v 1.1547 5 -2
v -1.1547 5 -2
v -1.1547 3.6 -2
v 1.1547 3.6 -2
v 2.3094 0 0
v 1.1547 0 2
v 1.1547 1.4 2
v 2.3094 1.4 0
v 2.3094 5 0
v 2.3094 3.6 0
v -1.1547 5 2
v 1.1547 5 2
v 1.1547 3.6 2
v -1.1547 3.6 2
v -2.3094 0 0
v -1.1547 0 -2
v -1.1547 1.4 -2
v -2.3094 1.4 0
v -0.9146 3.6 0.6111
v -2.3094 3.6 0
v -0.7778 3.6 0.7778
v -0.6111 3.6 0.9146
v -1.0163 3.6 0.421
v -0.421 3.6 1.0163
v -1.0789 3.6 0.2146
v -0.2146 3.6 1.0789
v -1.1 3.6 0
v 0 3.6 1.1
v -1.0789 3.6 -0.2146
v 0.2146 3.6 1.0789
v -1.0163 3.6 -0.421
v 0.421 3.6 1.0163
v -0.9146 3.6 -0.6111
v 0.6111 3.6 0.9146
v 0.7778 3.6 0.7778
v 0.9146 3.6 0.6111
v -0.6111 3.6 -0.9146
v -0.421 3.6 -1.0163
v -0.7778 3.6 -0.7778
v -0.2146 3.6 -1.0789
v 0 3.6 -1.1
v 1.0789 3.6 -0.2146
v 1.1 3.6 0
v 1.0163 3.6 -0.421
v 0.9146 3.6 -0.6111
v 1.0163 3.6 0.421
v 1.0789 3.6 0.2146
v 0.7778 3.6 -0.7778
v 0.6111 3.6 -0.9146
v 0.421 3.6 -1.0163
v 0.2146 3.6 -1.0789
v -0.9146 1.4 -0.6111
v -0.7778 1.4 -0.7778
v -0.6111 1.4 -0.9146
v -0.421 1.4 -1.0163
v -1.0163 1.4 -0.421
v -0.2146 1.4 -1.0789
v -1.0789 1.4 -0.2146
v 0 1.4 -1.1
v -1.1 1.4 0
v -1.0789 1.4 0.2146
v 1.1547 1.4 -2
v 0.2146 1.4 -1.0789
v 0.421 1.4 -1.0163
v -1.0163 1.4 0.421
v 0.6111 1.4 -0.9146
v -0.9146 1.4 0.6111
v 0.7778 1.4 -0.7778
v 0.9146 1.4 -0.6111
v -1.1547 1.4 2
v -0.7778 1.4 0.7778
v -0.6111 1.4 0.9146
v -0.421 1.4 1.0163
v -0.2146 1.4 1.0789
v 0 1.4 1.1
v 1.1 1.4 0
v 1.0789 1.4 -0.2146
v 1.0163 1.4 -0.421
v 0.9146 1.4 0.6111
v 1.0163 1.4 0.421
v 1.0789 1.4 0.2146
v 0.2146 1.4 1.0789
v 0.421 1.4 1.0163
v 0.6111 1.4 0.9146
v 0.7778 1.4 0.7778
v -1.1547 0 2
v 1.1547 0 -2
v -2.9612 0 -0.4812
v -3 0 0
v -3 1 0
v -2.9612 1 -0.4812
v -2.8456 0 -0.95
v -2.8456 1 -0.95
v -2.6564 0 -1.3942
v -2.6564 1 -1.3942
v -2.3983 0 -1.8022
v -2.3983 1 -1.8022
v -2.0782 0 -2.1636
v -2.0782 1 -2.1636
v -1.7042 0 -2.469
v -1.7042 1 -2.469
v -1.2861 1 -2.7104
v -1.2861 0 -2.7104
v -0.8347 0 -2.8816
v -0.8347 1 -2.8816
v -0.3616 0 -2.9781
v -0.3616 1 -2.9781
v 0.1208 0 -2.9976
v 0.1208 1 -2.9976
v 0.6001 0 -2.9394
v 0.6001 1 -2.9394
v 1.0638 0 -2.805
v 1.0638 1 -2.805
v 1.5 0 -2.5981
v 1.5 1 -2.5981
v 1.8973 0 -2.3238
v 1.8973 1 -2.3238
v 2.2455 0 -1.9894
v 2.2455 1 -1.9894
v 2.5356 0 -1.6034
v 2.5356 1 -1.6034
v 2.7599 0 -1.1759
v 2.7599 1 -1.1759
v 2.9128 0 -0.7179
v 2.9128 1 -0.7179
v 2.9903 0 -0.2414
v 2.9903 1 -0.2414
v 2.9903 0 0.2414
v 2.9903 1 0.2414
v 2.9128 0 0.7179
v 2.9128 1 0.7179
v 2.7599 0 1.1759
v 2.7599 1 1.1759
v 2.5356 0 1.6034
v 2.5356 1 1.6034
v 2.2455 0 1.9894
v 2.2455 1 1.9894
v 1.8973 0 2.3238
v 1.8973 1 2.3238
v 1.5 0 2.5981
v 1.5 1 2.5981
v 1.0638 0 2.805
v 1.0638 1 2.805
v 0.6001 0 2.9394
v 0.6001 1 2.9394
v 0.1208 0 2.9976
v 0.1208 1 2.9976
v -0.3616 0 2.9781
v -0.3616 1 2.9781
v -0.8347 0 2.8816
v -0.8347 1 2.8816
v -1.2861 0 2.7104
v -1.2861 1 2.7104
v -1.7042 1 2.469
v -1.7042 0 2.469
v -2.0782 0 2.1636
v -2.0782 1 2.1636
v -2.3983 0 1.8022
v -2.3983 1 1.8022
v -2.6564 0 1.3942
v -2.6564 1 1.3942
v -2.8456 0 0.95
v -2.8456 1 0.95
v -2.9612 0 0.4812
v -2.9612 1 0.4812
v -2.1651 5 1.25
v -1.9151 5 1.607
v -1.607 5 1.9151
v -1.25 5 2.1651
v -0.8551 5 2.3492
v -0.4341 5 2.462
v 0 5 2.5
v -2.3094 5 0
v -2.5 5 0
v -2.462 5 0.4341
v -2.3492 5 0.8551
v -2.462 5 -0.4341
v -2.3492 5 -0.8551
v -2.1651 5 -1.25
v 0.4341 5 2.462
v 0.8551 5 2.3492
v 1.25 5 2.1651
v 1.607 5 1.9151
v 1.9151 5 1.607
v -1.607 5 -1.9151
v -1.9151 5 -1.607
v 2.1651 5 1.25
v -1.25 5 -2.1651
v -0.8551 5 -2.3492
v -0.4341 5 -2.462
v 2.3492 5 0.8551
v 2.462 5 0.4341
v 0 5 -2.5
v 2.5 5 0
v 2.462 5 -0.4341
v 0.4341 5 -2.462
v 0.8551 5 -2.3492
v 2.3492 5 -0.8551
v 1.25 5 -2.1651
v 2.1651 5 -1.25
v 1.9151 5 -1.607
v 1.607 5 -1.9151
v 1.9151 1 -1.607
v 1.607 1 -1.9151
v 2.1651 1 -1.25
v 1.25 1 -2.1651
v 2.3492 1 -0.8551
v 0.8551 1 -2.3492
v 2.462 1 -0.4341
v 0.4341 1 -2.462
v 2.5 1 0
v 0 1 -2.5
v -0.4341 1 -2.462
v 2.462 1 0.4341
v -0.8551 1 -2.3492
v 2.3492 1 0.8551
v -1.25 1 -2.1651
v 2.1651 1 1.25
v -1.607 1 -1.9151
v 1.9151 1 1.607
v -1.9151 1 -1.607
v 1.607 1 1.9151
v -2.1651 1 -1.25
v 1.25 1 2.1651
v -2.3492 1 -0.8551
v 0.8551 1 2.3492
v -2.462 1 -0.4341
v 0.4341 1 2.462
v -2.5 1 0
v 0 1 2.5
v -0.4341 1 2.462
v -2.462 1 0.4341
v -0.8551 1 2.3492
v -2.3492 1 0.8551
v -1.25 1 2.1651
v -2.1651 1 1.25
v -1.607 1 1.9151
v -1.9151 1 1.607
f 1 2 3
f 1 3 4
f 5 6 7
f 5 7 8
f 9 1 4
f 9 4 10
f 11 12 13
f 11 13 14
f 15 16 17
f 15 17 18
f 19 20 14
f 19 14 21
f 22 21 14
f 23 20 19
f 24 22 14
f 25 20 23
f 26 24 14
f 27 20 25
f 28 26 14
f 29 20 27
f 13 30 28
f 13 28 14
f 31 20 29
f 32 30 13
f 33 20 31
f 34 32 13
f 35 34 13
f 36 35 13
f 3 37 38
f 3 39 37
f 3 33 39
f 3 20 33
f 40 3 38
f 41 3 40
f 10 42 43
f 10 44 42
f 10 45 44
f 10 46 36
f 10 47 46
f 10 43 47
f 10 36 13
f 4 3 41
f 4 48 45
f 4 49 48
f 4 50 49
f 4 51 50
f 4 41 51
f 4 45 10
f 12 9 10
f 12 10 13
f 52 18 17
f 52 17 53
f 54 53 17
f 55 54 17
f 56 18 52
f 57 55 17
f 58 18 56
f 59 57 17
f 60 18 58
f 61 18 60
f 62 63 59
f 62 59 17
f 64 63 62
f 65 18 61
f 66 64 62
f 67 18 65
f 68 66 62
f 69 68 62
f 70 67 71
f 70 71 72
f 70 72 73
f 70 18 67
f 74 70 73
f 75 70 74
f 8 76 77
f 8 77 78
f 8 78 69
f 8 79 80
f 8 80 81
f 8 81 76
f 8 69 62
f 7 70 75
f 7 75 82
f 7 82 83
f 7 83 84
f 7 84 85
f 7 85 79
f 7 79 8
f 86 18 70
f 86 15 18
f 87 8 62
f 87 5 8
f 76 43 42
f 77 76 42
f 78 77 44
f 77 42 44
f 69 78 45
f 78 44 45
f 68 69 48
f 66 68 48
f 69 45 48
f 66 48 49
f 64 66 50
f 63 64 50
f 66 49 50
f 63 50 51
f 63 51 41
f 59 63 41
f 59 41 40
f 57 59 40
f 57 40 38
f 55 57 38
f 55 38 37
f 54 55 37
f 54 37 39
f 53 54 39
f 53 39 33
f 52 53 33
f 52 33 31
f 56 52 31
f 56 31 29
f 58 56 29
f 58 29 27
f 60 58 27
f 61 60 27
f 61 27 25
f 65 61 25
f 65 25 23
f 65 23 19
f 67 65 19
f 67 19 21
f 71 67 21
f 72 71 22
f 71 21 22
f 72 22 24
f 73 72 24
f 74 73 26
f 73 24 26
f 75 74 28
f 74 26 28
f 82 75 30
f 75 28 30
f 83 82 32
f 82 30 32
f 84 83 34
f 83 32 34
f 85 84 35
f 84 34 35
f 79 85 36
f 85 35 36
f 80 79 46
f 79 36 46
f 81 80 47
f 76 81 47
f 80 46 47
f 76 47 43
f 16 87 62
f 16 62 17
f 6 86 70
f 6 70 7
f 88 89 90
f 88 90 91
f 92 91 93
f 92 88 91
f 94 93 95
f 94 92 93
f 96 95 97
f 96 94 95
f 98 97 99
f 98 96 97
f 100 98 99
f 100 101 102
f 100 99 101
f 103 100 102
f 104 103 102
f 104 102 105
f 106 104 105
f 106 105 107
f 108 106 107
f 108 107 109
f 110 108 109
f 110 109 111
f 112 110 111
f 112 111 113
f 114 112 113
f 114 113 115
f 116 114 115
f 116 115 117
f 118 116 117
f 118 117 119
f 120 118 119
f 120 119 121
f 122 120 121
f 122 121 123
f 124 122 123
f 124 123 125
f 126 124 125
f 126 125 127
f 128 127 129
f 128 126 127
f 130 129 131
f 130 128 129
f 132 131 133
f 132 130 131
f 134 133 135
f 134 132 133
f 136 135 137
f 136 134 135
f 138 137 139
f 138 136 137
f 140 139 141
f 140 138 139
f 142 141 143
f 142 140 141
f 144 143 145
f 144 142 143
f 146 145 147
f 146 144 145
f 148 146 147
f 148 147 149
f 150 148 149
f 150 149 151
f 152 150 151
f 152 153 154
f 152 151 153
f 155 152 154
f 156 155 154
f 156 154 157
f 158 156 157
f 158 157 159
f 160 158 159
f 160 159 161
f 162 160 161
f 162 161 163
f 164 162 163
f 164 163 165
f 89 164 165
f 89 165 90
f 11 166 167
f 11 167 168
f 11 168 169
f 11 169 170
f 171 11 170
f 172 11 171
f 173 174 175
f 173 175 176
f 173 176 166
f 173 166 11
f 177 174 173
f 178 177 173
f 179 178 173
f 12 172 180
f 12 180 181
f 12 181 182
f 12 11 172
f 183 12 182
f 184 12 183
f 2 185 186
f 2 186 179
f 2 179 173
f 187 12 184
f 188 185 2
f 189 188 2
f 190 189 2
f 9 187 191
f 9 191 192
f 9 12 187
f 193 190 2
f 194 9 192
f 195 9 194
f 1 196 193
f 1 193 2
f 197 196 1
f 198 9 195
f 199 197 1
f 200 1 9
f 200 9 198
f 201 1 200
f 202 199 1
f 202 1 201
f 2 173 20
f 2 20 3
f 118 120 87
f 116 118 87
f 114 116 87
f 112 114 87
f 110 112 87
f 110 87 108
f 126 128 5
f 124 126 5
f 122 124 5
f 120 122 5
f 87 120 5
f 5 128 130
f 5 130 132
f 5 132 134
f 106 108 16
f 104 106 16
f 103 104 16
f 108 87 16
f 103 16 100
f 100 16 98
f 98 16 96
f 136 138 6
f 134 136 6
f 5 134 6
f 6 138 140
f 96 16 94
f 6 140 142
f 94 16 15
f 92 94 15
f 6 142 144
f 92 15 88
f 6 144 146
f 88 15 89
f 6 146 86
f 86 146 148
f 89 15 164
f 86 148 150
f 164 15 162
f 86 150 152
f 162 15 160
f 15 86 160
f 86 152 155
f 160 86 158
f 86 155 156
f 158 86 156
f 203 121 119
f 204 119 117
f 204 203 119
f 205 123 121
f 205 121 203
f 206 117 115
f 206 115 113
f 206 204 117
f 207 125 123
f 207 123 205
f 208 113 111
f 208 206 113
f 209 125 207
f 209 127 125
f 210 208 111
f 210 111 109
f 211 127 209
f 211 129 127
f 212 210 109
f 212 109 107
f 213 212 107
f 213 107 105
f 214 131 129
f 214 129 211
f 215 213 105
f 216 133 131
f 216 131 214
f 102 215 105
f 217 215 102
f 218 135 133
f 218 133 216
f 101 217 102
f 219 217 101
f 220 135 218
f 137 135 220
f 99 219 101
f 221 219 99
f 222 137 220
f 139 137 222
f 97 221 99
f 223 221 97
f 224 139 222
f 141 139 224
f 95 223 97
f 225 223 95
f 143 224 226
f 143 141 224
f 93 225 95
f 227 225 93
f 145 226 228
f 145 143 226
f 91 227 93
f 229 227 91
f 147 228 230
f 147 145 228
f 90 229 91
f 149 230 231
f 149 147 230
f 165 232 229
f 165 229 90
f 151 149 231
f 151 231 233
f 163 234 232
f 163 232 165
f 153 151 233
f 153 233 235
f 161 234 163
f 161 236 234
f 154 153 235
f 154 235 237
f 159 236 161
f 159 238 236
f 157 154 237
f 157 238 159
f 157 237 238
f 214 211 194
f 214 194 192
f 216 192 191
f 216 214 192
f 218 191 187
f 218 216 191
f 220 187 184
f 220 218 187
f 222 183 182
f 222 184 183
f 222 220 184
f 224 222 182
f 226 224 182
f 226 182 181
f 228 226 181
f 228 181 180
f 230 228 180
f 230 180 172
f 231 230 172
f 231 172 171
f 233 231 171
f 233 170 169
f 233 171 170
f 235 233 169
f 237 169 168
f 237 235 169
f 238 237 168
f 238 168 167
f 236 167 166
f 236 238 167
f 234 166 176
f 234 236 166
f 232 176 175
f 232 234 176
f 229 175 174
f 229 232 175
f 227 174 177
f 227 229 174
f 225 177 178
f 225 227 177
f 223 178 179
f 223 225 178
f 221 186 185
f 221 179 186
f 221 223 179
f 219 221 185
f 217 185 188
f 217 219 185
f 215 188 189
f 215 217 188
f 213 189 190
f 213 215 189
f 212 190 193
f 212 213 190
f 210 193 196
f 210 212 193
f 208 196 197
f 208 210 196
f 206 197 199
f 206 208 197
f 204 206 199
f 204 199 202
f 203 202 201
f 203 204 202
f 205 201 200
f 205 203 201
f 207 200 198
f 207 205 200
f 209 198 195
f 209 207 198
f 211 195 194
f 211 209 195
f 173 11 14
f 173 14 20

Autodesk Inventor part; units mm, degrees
ref_plane "YZ Plane" through (0, 0, 0) normal (1, 0, 0) x (0, 1, 0)
ref_plane "XZ Plane" through (0, 0, 0) normal (0, 1, 0) x (-1, 0, 0)
ref_plane "XY Plane" through (0, 0, 0) normal (0, 0, 1) x (1, 0, 0)
sketch "Эскиз1" plane through (0, 0, 0) normal (0, 1, 0) x (-1, 0, 0)
  circle A0 centre (0, 0) radius 3
  dimension "d0" = 6
extrude "Выдавливание1" add sketch "Эскиз1" along normal blind 1
sketch "Эскиз2" plane through (0, 1, 0) normal (0, 1, 0) x (1, 0, 0)
  circle A0 centre (0, 0) radius 2.5
  dimension "d3" = 5
extrude "Выдавливание2" add sketch "Эскиз2" along normal blind 4
sketch "Эскиз3" plane through (0, 5, 0) normal (0, 1, 0) x (1, 0, 0)
  circle A0 centre (0, 0) radius 3 projected
  line L0 (-2.3094, 0) -> (-1.1547, 2)
  line L1 (-1.1547, 2) -> (1.1547, 2)
  line L2 (1.1547, 2) -> (2.3094, 0)
  line L3 (2.3094, 0) -> (1.1547, -2)
  line L4 (1.1547, -2) -> (-1.1547, -2)
  line L5 (-1.1547, -2) -> (-2.3094, 0)
  dimension "d6" = 4
extrude "Выдавливание3" cut sketch "Эскиз3" against normal blind 1.4 contours L0 L1 L2 L3 L4 L5
sketch "Эскиз4" plane through (0, 3.6, 0) normal (0, 1, 0) x (1, 0, 0)
  circle A0 centre (0, 0) radius 1.1
  dimension "d9" = 2.2
extrude "Выдавливание4" cut sketch "Эскиз4" against normal up to surface (3.6 mm away)
sketch "Эскиз5" plane through (0, 0, 0) normal (0, -1, 0) x (1, 0, 0)
  line L0 (2.3094, 0) -> (1.1547, -2)
  line L1 (1.1547, -2) -> (-1.1547, -2)
  line L2 (-1.1547, -2) -> (-2.3094, 0)
  line L3 (-2.3094, 0) -> (-1.1547, 2)
  line L4 (-1.1547, 2) -> (1.1547, 2)
  line L5 (1.1547, 2) -> (2.3094, 0)
  point P0 (0, 0)
  point P1 (0, 0)
  dimension "d12" = 4
extrude "Выдавливание5" cut sketch "Эскиз5" against normal blind 1.4
properties part number "втулка_каретка"
